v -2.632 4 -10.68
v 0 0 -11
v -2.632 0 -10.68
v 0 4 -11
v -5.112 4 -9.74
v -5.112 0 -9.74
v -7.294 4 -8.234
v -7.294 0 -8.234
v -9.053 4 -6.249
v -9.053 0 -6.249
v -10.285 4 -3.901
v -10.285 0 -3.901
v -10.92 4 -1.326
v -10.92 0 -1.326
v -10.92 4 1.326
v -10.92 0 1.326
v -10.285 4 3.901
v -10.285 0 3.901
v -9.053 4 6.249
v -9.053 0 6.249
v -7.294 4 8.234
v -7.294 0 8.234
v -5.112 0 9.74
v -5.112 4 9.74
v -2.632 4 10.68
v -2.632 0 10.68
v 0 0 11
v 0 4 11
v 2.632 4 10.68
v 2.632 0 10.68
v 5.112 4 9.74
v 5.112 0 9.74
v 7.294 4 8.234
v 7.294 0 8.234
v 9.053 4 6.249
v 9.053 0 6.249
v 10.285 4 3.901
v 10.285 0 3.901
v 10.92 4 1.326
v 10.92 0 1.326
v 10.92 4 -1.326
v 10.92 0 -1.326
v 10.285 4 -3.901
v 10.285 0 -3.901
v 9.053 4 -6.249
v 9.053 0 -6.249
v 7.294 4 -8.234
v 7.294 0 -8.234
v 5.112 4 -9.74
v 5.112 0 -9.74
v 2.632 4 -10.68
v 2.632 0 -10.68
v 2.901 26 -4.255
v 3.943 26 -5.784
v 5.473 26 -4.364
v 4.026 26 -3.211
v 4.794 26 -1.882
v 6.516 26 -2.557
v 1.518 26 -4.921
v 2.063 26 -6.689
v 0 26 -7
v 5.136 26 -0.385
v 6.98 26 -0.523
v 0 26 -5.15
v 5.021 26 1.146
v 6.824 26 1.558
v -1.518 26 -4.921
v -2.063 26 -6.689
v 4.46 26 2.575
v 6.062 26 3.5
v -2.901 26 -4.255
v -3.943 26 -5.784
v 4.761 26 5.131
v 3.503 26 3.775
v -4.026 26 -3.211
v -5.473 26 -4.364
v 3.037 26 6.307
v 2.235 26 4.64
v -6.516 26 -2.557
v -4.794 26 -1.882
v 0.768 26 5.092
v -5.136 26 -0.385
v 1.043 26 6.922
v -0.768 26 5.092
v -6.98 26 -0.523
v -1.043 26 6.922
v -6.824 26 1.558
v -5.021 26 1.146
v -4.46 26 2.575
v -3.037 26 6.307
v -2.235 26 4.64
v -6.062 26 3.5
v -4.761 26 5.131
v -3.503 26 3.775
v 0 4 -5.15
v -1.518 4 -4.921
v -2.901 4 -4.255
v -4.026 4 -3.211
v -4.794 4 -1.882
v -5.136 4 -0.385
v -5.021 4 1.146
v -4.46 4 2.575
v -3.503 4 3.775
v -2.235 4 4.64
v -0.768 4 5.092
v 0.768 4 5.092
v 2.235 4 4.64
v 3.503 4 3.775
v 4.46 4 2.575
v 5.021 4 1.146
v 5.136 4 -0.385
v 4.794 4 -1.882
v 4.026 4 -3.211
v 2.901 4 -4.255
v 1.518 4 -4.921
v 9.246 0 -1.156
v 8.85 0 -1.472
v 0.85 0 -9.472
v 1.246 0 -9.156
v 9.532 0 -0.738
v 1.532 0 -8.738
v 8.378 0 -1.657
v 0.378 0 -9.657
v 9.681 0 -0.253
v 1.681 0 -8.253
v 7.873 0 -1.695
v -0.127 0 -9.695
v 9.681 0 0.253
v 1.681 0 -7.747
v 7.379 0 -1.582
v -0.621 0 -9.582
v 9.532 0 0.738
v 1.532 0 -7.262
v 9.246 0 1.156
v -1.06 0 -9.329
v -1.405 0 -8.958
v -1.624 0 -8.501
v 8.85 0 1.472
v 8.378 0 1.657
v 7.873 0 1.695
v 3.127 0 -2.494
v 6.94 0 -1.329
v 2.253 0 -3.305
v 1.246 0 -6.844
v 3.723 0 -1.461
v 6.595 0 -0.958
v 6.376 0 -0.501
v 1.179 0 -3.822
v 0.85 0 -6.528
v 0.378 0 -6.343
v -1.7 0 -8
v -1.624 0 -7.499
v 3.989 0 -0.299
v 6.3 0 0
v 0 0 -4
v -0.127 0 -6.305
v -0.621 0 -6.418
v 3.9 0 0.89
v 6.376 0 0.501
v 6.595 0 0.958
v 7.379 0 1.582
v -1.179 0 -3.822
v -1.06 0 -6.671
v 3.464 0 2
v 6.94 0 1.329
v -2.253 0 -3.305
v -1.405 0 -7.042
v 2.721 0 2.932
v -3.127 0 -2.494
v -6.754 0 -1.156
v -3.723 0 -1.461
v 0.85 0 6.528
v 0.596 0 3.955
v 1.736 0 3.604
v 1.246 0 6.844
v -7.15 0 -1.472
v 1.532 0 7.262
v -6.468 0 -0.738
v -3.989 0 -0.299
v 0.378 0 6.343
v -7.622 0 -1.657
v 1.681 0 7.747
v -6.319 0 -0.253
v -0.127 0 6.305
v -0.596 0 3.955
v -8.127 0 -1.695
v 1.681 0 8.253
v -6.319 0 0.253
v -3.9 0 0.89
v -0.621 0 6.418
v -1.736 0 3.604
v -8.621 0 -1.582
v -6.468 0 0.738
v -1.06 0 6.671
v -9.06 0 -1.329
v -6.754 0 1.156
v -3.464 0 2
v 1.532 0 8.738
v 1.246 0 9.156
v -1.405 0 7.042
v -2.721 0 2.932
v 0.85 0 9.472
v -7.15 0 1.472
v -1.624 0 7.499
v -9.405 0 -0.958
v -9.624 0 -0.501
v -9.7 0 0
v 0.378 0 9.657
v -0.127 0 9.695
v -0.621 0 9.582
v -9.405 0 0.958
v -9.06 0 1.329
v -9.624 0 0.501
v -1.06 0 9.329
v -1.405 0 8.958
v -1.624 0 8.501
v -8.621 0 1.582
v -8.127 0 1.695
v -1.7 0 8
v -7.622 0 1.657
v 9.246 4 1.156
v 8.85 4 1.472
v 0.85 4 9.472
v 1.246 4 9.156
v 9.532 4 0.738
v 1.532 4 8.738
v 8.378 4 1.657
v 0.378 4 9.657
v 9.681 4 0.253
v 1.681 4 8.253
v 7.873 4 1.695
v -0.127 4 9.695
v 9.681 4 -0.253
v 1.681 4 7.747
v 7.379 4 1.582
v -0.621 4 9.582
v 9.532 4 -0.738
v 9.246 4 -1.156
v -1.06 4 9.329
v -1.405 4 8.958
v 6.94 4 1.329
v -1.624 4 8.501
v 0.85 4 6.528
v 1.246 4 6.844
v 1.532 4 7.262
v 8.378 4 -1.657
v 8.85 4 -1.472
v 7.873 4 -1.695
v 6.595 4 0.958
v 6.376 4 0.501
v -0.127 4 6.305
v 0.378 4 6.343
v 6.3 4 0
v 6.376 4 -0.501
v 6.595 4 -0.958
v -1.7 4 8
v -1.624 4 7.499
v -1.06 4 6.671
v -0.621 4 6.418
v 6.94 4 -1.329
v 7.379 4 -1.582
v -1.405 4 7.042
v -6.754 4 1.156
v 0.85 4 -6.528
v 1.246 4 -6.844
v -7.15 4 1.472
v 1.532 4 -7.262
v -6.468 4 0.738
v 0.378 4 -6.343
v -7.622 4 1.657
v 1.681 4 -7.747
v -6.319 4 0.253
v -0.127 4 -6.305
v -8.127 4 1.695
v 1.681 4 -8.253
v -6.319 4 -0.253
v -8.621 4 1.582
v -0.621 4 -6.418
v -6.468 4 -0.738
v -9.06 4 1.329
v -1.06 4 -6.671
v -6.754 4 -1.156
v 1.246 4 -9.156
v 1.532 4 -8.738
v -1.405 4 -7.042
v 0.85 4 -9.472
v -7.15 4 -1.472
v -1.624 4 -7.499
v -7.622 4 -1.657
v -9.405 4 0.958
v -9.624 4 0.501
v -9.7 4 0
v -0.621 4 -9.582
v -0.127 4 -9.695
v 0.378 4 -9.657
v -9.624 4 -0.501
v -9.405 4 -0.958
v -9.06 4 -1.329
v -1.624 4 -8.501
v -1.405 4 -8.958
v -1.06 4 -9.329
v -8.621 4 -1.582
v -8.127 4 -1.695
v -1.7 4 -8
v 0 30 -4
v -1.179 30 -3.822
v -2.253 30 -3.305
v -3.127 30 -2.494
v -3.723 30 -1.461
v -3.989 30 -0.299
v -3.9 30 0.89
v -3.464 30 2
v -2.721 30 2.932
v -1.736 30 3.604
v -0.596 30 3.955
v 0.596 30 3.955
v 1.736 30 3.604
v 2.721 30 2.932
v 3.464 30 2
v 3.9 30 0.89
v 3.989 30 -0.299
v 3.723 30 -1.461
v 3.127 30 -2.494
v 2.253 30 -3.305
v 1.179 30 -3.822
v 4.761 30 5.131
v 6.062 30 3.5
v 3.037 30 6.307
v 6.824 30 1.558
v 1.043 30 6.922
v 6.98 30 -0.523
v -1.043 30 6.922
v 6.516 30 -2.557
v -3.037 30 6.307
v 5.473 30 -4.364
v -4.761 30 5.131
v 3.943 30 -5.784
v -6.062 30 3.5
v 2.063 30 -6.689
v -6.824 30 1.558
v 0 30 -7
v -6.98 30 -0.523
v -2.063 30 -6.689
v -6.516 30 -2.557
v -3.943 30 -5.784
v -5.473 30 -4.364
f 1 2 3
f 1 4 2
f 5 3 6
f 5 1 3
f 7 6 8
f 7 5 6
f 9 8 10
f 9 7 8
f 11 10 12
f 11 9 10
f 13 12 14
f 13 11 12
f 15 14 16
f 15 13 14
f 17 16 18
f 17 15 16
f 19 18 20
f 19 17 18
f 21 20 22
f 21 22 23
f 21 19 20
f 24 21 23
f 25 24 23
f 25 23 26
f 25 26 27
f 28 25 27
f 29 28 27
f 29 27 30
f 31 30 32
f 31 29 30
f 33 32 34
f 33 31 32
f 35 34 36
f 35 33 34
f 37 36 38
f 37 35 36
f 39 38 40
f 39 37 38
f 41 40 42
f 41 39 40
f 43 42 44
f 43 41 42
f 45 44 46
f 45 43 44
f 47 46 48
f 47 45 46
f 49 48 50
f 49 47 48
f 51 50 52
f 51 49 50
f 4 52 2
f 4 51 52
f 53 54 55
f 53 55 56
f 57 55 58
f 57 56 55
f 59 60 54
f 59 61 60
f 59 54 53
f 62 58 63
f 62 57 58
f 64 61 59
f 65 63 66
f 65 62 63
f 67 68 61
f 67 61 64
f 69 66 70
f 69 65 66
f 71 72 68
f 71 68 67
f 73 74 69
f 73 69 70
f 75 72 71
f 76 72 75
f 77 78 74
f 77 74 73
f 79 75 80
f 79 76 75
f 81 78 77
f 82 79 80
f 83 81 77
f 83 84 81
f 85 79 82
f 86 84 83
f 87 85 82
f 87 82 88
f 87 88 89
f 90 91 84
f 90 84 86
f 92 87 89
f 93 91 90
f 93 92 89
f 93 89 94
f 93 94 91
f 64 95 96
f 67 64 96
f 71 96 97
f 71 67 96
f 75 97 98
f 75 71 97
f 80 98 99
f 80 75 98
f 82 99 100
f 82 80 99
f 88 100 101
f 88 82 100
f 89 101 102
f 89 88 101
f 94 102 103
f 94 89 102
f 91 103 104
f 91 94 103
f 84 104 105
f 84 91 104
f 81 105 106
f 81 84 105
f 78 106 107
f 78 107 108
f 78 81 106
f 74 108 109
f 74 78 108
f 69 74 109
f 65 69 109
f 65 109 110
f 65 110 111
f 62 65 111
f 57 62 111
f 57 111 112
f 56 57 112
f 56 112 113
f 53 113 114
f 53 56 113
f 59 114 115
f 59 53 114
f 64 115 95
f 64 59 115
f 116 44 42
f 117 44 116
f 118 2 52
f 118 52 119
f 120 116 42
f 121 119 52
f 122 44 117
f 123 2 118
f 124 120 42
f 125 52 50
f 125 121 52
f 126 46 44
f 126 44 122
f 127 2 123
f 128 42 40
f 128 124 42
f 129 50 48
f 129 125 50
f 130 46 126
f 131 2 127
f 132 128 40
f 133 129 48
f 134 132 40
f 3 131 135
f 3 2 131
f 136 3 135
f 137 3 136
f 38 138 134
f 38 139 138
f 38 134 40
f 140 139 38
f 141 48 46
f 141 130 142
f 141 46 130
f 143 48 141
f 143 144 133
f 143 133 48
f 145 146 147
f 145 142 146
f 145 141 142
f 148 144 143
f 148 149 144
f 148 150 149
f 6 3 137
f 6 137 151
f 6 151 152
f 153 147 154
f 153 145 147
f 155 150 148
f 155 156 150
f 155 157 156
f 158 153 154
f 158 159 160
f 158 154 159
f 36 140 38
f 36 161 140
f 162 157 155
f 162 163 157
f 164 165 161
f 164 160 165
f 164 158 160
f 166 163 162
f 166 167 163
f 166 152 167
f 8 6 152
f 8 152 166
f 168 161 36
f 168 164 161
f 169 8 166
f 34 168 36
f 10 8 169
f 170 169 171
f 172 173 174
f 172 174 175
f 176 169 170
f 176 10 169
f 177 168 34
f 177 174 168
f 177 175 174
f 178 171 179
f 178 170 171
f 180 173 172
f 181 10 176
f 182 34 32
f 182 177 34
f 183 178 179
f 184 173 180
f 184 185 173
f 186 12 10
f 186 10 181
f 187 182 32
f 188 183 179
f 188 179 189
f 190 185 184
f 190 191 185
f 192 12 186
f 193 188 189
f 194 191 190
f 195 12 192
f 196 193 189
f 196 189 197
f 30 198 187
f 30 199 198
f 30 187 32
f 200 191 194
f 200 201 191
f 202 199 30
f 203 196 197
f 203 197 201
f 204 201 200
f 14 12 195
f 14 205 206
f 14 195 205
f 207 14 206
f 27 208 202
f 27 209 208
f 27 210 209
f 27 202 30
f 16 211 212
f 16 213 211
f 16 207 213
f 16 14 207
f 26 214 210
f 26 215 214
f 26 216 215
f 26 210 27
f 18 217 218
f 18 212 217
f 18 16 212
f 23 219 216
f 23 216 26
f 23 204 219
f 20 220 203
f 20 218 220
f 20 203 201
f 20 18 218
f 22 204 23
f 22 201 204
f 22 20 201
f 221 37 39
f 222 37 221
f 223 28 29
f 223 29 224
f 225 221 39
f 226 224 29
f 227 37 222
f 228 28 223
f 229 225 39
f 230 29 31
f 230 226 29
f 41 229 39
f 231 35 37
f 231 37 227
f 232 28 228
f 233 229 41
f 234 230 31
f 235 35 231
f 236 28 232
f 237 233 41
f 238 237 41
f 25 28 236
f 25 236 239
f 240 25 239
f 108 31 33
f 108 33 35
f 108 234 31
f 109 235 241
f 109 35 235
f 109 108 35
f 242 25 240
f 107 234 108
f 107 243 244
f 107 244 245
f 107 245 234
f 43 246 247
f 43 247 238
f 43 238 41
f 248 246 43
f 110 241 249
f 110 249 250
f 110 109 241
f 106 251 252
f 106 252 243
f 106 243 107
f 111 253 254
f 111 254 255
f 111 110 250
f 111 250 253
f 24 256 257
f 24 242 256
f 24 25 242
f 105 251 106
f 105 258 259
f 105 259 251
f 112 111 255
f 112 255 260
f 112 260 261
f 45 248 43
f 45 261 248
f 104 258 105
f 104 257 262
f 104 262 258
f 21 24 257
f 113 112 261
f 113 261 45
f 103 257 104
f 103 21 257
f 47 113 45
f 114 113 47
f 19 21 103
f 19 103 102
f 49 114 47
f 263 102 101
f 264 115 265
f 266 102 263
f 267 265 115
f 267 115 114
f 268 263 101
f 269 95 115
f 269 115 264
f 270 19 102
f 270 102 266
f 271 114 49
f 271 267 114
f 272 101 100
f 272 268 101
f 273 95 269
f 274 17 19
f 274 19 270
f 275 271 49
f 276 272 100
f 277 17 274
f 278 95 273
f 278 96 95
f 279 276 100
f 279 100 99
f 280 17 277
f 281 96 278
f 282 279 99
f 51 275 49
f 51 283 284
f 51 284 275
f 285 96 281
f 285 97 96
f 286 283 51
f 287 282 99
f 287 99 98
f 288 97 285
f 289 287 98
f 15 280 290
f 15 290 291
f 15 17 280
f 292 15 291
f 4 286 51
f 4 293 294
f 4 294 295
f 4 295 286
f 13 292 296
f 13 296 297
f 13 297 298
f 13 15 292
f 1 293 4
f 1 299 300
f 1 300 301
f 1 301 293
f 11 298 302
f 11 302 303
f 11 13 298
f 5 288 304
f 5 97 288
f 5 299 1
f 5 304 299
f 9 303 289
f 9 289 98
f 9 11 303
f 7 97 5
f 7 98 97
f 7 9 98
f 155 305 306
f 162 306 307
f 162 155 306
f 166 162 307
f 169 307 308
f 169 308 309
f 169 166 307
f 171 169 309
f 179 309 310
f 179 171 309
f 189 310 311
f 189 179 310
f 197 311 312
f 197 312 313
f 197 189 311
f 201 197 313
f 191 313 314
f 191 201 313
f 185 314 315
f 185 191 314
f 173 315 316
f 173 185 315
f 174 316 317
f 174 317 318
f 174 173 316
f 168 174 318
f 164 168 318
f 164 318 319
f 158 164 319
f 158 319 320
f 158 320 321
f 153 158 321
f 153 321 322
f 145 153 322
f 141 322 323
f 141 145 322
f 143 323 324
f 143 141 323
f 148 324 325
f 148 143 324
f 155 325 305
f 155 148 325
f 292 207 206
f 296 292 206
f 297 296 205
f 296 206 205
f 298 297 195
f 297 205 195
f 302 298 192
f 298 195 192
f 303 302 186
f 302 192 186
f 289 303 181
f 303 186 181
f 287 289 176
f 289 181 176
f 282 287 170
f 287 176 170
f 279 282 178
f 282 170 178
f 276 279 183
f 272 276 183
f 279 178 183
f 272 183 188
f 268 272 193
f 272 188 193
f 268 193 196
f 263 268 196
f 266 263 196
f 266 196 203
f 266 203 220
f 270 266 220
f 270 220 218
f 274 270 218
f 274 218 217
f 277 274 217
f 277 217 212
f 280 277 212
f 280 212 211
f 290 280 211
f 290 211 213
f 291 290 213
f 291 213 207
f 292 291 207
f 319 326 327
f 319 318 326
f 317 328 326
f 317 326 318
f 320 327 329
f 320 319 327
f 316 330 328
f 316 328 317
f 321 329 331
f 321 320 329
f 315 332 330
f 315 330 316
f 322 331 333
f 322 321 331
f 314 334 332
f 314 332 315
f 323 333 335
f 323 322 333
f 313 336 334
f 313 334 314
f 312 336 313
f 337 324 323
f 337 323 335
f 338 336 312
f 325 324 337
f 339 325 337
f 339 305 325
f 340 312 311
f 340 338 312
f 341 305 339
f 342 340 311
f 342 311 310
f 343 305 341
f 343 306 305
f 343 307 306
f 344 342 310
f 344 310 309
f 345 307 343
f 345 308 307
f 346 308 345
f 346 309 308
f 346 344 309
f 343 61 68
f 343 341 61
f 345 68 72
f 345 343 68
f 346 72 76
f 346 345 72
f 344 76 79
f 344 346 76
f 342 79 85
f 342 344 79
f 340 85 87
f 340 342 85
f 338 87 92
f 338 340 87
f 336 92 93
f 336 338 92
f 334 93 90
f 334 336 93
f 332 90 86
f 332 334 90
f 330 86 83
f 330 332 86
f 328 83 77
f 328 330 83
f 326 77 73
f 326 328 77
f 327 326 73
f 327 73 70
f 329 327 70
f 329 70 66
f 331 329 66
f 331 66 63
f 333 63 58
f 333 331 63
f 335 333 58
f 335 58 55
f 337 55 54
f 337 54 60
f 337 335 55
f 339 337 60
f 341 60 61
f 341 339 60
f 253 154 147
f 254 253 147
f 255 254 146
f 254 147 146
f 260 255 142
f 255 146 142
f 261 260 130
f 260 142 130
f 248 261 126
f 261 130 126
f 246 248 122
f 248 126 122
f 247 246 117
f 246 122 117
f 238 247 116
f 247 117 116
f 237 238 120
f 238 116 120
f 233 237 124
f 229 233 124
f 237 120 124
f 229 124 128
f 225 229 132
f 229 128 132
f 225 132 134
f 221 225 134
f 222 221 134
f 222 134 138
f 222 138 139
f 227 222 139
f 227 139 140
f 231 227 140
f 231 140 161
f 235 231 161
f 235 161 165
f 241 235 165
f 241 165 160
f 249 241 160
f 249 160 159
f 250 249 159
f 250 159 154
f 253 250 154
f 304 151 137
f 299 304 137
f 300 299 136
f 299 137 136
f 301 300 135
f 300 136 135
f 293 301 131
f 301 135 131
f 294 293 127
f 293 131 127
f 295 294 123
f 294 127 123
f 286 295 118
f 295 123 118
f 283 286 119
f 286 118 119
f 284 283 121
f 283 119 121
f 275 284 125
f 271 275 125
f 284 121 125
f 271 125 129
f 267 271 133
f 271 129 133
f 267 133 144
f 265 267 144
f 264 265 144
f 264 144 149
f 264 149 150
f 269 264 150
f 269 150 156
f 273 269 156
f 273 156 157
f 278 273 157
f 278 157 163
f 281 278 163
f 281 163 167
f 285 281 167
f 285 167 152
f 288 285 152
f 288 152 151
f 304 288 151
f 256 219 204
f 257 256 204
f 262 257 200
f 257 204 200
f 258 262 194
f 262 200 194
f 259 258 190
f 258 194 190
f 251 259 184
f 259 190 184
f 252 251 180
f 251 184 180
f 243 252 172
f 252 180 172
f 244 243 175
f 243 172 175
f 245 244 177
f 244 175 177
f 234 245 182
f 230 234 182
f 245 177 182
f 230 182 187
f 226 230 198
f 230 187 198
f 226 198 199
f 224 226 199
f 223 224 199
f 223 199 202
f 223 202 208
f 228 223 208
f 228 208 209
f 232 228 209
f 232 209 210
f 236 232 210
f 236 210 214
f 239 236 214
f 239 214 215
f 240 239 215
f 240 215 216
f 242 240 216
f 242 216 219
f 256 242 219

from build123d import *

# Parameters (mm, degrees)
M3_CLEARANCE_HOLE1_REACH  = 35.793
M3_CLEARANCE_HOLE1_BORE_R = 1.7


with BuildPart() as part:
    # Sketch2 → Revolve1 (revolve)
    with BuildSketch(Plane.XY, mode=Mode.PRIVATE) as revolve1_sk:
        Polygon((4, 30), (4, 0), (11, 0), (11, 4), (5.15, 4), (5.15, 26), (7, 26), (7, 30), align=None)
    revolve(revolve1_sk.sketch.rotate(Axis((0, 0, 0), (0, 1, 0)), 90), axis=Axis((0, 0, 0), (0, 1, 0)))

    # M3 Clearance Hole1 bore → M3 Clearance Hole1 (cut, up to next)
    with BuildSketch(Plane(origin=(0, 0, 0), x_dir=(-1, 0, 0), z_dir=(0, -1, 0)), mode=Mode.PRIVATE) as m3_clearance_hole1_sk1:
        with Locations((0, -8)):
            Circle(M3_CLEARANCE_HOLE1_BORE_R)
    m3_clearance_hole1_tool1 = extrude(m3_clearance_hole1_sk1.sketch, amount=-M3_CLEARANCE_HOLE1_REACH, mode=Mode.PRIVATE) & part.part
    # M3 Clearance Hole1 bore → M3 Clearance Hole1 (cut, up to next)
    with BuildSketch(Plane(origin=(0, 0, 0), x_dir=(-1, 0, 0), z_dir=(0, -1, 0)), mode=Mode.PRIVATE) as m3_clearance_hole1_sk2:
        with Locations((-8, 0)):
            Circle(M3_CLEARANCE_HOLE1_BORE_R)
    m3_clearance_hole1_tool2 = extrude(m3_clearance_hole1_sk2.sketch, amount=-M3_CLEARANCE_HOLE1_REACH, mode=Mode.PRIVATE) & part.part
    # M3 Clearance Hole1 bore → M3 Clearance Hole1 (cut, up to next)
    with BuildSketch(Plane(origin=(0, 0, 0), x_dir=(-1, 0, 0), z_dir=(0, -1, 0)), mode=Mode.PRIVATE) as m3_clearance_hole1_sk3:
        with Locations((0, 8)):
            Circle(M3_CLEARANCE_HOLE1_BORE_R)
    m3_clearance_hole1_tool3 = extrude(m3_clearance_hole1_sk3.sketch, amount=-M3_CLEARANCE_HOLE1_REACH, mode=Mode.PRIVATE) & part.part
    # M3 Clearance Hole1 bore → M3 Clearance Hole1 (cut, up to next)
    with BuildSketch(Plane(origin=(0, 0, 0), x_dir=(-1, 0, 0), z_dir=(0, -1, 0)), mode=Mode.PRIVATE) as m3_clearance_hole1_sk4:
        with Locations((8, 0)):
            Circle(M3_CLEARANCE_HOLE1_BORE_R)
    m3_clearance_hole1_tool4 = extrude(m3_clearance_hole1_sk4.sketch, amount=-M3_CLEARANCE_HOLE1_REACH, mode=Mode.PRIVATE) & part.part
    add(m3_clearance_hole1_tool1.solids().sort_by_distance((0, 0, 8))[0], mode=Mode.SUBTRACT)
    add(m3_clearance_hole1_tool2.solids().sort_by_distance((8, 0, 0))[0], mode=Mode.SUBTRACT)
    add(m3_clearance_hole1_tool3.solids().sort_by_distance((0, 0, -8))[0], mode=Mode.SUBTRACT)
    add(m3_clearance_hole1_tool4.solids().sort_by_distance((-8, 0, 0))[0], mode=Mode.SUBTRACT)


solid = part.part
